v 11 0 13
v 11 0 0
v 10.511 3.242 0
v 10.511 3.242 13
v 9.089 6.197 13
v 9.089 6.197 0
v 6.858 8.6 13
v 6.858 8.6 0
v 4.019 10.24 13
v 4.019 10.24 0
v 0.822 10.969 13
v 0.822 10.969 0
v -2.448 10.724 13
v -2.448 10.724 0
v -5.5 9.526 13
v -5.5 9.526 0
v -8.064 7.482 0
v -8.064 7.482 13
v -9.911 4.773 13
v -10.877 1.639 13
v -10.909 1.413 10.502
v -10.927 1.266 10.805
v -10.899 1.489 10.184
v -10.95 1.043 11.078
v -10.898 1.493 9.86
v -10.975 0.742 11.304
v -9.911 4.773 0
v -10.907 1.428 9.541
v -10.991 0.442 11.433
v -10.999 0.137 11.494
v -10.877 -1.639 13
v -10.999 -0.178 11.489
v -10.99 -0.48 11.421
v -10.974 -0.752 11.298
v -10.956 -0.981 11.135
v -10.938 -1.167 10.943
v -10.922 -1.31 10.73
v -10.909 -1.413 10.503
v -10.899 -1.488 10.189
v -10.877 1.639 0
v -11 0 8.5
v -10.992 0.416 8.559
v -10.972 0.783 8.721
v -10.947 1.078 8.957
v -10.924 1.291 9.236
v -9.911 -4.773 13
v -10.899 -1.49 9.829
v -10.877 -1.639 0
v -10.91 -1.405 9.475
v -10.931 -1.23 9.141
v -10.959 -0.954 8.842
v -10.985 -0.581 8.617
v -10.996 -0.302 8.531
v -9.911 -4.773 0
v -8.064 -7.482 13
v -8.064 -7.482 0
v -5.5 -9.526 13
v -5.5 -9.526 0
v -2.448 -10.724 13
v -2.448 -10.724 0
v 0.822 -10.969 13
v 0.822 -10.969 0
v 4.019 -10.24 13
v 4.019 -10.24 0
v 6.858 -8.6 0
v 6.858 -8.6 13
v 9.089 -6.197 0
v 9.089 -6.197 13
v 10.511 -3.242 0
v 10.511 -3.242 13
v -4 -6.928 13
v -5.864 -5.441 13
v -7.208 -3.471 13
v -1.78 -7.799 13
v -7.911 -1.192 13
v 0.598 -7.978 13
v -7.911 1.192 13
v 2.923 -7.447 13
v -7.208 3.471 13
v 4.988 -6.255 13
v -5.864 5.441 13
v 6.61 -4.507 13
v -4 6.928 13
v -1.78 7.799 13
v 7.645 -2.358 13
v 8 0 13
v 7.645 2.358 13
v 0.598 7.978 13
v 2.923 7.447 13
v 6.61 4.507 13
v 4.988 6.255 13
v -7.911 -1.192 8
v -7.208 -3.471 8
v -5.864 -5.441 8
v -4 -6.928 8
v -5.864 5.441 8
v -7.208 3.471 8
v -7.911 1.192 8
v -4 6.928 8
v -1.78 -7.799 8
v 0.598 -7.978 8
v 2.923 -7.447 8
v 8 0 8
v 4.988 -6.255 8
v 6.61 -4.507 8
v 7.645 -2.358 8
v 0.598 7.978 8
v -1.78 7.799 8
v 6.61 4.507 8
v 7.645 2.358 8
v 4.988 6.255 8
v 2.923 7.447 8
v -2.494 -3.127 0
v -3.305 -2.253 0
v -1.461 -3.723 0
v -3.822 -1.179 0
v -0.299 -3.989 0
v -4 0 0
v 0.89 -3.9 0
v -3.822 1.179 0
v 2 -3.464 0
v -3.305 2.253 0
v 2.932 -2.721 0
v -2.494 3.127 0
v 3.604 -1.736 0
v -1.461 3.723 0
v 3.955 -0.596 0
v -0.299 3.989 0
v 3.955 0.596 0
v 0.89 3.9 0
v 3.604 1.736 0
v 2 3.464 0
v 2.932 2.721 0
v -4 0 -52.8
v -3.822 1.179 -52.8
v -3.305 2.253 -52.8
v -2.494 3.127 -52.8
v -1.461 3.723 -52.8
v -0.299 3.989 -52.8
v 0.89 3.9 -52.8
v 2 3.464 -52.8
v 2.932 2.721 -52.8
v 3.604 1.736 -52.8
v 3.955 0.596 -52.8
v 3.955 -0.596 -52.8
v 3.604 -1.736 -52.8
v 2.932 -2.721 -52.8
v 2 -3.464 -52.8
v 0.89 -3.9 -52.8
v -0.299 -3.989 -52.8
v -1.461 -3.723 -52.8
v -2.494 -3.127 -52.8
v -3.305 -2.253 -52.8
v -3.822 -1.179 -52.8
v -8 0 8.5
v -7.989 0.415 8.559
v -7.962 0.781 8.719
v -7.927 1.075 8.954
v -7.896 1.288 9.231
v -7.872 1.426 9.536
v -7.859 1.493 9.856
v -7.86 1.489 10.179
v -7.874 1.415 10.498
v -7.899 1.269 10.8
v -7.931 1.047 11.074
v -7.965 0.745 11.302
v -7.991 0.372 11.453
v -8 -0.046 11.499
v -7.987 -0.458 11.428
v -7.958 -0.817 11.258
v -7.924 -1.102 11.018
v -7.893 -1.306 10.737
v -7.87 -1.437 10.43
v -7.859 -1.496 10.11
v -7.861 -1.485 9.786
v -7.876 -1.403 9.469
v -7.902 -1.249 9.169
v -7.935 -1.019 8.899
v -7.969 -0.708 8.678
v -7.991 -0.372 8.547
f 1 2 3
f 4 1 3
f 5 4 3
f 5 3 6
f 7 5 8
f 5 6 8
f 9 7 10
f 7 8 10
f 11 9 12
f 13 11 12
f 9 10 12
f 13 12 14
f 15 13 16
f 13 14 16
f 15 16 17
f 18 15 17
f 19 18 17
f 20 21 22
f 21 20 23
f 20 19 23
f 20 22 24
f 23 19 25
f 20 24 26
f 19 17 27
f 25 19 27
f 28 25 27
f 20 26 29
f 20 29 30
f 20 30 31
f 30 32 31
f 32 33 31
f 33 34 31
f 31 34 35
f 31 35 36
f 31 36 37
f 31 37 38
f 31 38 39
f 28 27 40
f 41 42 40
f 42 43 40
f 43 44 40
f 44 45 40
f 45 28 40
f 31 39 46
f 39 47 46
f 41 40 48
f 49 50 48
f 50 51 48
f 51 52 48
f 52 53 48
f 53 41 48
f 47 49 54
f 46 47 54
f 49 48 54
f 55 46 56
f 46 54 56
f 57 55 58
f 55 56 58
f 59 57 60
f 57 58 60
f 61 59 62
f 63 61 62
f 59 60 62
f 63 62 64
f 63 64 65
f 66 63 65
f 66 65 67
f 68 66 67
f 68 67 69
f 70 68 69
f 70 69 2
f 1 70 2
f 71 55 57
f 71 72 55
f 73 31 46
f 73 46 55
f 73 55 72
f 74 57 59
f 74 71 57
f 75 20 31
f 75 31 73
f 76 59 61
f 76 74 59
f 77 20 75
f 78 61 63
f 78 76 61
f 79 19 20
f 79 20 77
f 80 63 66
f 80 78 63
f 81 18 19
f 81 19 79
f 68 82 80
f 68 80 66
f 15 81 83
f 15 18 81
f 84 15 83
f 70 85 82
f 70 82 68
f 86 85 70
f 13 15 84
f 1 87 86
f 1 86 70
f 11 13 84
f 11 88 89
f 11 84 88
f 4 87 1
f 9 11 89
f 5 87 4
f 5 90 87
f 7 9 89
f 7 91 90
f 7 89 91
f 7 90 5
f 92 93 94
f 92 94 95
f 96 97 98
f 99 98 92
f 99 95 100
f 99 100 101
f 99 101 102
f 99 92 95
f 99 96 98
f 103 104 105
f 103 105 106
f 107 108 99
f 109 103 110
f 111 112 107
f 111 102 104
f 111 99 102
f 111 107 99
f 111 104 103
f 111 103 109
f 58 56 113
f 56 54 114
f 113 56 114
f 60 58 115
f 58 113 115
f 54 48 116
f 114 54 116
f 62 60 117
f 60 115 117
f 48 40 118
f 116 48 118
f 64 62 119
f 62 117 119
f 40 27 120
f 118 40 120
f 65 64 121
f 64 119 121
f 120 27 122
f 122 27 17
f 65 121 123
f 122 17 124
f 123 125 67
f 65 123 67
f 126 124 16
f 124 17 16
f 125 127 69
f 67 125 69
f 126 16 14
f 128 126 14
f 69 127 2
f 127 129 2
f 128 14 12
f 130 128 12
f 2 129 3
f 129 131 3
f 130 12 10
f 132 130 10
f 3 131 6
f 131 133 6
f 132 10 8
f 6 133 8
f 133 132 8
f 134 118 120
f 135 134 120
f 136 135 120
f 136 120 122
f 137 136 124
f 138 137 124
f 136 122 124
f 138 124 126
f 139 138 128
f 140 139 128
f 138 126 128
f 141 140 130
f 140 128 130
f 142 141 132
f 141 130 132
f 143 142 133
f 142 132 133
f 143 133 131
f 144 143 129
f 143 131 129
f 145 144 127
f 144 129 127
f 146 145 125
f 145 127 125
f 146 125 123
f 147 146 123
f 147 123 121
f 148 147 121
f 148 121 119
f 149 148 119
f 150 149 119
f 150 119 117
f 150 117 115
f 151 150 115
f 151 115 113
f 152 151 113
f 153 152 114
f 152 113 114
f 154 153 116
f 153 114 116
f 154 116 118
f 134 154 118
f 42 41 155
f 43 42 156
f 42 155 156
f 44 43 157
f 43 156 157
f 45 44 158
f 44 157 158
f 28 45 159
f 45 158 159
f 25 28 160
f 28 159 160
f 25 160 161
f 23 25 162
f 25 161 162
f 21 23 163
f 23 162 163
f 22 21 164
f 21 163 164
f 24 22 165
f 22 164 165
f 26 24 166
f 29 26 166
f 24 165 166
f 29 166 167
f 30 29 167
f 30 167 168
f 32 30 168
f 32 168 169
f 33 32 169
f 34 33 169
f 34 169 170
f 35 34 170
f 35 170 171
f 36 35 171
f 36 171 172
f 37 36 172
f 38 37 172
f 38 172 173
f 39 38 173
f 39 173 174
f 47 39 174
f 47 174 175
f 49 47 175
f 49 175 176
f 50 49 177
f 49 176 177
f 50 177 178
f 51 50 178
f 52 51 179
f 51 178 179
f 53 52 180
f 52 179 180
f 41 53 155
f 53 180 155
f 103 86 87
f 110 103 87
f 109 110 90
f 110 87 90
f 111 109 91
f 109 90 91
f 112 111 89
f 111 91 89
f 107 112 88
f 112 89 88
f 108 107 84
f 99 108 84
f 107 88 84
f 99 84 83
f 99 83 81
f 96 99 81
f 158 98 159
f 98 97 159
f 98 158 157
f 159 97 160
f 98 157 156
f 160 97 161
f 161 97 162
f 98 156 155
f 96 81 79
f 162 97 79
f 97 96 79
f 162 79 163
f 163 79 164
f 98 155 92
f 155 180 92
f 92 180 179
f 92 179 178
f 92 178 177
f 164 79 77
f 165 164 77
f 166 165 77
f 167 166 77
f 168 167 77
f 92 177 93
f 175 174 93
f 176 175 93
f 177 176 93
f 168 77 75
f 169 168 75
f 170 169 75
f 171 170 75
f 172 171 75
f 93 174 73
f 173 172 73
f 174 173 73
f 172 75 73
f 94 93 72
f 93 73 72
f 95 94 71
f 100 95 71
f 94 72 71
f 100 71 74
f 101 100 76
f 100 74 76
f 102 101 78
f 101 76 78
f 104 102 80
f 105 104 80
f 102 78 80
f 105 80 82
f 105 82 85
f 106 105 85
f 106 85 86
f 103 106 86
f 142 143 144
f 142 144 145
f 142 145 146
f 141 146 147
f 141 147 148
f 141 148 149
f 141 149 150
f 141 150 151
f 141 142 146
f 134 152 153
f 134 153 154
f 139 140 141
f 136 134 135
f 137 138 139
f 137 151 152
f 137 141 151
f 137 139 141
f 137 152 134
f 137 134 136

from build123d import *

# Parameters (mm, degrees)
CROQUIS1_R              = 11
SALIENTE_EXTRUIR1_DEPTH = 13
CROQUIS2_R              = 8
CORTAR_EXTRUIR1_DEPTH   = 5
CROQUIS3_R              = 1.5
CORTAR_EXTRUIR2_DEPTH   = 15
CROQUIS4_R              = 4
SALIENTE_EXTRUIR2_DEPTH = 52.8


with BuildPart() as part:
    # Croquis1 → Saliente-Extruir1 (new body)
    with BuildSketch(Plane.XY):
        Circle(CROQUIS1_R)
    extrude(amount=SALIENTE_EXTRUIR1_DEPTH)

    # Croquis2 → Cortar-Extruir1 (cut)
    with BuildSketch(Plane.XY.offset(13)):
        Circle(CROQUIS2_R)
    extrude(amount=-CORTAR_EXTRUIR1_DEPTH, mode=Mode.SUBTRACT)

    # Croquis3 → Cortar-Extruir2 (cut)
    with BuildSketch(Plane(origin=(0, 0, 0), x_dir=(0, 0, -1), z_dir=(1, 0, 0))):
        with Locations((-10, 0)):
            Circle(CROQUIS3_R)
    extrude(amount=-CORTAR_EXTRUIR2_DEPTH, mode=Mode.SUBTRACT)

    # Croquis4 → Saliente-Extruir2 (add)
    with BuildSketch(Plane(origin=(0, 0, 0), x_dir=(-1, 0, 0), z_dir=(0, 0, -1))):
        Circle(CROQUIS4_R)
    extrude(amount=SALIENTE_EXTRUIR2_DEPTH)


solid = part.part
